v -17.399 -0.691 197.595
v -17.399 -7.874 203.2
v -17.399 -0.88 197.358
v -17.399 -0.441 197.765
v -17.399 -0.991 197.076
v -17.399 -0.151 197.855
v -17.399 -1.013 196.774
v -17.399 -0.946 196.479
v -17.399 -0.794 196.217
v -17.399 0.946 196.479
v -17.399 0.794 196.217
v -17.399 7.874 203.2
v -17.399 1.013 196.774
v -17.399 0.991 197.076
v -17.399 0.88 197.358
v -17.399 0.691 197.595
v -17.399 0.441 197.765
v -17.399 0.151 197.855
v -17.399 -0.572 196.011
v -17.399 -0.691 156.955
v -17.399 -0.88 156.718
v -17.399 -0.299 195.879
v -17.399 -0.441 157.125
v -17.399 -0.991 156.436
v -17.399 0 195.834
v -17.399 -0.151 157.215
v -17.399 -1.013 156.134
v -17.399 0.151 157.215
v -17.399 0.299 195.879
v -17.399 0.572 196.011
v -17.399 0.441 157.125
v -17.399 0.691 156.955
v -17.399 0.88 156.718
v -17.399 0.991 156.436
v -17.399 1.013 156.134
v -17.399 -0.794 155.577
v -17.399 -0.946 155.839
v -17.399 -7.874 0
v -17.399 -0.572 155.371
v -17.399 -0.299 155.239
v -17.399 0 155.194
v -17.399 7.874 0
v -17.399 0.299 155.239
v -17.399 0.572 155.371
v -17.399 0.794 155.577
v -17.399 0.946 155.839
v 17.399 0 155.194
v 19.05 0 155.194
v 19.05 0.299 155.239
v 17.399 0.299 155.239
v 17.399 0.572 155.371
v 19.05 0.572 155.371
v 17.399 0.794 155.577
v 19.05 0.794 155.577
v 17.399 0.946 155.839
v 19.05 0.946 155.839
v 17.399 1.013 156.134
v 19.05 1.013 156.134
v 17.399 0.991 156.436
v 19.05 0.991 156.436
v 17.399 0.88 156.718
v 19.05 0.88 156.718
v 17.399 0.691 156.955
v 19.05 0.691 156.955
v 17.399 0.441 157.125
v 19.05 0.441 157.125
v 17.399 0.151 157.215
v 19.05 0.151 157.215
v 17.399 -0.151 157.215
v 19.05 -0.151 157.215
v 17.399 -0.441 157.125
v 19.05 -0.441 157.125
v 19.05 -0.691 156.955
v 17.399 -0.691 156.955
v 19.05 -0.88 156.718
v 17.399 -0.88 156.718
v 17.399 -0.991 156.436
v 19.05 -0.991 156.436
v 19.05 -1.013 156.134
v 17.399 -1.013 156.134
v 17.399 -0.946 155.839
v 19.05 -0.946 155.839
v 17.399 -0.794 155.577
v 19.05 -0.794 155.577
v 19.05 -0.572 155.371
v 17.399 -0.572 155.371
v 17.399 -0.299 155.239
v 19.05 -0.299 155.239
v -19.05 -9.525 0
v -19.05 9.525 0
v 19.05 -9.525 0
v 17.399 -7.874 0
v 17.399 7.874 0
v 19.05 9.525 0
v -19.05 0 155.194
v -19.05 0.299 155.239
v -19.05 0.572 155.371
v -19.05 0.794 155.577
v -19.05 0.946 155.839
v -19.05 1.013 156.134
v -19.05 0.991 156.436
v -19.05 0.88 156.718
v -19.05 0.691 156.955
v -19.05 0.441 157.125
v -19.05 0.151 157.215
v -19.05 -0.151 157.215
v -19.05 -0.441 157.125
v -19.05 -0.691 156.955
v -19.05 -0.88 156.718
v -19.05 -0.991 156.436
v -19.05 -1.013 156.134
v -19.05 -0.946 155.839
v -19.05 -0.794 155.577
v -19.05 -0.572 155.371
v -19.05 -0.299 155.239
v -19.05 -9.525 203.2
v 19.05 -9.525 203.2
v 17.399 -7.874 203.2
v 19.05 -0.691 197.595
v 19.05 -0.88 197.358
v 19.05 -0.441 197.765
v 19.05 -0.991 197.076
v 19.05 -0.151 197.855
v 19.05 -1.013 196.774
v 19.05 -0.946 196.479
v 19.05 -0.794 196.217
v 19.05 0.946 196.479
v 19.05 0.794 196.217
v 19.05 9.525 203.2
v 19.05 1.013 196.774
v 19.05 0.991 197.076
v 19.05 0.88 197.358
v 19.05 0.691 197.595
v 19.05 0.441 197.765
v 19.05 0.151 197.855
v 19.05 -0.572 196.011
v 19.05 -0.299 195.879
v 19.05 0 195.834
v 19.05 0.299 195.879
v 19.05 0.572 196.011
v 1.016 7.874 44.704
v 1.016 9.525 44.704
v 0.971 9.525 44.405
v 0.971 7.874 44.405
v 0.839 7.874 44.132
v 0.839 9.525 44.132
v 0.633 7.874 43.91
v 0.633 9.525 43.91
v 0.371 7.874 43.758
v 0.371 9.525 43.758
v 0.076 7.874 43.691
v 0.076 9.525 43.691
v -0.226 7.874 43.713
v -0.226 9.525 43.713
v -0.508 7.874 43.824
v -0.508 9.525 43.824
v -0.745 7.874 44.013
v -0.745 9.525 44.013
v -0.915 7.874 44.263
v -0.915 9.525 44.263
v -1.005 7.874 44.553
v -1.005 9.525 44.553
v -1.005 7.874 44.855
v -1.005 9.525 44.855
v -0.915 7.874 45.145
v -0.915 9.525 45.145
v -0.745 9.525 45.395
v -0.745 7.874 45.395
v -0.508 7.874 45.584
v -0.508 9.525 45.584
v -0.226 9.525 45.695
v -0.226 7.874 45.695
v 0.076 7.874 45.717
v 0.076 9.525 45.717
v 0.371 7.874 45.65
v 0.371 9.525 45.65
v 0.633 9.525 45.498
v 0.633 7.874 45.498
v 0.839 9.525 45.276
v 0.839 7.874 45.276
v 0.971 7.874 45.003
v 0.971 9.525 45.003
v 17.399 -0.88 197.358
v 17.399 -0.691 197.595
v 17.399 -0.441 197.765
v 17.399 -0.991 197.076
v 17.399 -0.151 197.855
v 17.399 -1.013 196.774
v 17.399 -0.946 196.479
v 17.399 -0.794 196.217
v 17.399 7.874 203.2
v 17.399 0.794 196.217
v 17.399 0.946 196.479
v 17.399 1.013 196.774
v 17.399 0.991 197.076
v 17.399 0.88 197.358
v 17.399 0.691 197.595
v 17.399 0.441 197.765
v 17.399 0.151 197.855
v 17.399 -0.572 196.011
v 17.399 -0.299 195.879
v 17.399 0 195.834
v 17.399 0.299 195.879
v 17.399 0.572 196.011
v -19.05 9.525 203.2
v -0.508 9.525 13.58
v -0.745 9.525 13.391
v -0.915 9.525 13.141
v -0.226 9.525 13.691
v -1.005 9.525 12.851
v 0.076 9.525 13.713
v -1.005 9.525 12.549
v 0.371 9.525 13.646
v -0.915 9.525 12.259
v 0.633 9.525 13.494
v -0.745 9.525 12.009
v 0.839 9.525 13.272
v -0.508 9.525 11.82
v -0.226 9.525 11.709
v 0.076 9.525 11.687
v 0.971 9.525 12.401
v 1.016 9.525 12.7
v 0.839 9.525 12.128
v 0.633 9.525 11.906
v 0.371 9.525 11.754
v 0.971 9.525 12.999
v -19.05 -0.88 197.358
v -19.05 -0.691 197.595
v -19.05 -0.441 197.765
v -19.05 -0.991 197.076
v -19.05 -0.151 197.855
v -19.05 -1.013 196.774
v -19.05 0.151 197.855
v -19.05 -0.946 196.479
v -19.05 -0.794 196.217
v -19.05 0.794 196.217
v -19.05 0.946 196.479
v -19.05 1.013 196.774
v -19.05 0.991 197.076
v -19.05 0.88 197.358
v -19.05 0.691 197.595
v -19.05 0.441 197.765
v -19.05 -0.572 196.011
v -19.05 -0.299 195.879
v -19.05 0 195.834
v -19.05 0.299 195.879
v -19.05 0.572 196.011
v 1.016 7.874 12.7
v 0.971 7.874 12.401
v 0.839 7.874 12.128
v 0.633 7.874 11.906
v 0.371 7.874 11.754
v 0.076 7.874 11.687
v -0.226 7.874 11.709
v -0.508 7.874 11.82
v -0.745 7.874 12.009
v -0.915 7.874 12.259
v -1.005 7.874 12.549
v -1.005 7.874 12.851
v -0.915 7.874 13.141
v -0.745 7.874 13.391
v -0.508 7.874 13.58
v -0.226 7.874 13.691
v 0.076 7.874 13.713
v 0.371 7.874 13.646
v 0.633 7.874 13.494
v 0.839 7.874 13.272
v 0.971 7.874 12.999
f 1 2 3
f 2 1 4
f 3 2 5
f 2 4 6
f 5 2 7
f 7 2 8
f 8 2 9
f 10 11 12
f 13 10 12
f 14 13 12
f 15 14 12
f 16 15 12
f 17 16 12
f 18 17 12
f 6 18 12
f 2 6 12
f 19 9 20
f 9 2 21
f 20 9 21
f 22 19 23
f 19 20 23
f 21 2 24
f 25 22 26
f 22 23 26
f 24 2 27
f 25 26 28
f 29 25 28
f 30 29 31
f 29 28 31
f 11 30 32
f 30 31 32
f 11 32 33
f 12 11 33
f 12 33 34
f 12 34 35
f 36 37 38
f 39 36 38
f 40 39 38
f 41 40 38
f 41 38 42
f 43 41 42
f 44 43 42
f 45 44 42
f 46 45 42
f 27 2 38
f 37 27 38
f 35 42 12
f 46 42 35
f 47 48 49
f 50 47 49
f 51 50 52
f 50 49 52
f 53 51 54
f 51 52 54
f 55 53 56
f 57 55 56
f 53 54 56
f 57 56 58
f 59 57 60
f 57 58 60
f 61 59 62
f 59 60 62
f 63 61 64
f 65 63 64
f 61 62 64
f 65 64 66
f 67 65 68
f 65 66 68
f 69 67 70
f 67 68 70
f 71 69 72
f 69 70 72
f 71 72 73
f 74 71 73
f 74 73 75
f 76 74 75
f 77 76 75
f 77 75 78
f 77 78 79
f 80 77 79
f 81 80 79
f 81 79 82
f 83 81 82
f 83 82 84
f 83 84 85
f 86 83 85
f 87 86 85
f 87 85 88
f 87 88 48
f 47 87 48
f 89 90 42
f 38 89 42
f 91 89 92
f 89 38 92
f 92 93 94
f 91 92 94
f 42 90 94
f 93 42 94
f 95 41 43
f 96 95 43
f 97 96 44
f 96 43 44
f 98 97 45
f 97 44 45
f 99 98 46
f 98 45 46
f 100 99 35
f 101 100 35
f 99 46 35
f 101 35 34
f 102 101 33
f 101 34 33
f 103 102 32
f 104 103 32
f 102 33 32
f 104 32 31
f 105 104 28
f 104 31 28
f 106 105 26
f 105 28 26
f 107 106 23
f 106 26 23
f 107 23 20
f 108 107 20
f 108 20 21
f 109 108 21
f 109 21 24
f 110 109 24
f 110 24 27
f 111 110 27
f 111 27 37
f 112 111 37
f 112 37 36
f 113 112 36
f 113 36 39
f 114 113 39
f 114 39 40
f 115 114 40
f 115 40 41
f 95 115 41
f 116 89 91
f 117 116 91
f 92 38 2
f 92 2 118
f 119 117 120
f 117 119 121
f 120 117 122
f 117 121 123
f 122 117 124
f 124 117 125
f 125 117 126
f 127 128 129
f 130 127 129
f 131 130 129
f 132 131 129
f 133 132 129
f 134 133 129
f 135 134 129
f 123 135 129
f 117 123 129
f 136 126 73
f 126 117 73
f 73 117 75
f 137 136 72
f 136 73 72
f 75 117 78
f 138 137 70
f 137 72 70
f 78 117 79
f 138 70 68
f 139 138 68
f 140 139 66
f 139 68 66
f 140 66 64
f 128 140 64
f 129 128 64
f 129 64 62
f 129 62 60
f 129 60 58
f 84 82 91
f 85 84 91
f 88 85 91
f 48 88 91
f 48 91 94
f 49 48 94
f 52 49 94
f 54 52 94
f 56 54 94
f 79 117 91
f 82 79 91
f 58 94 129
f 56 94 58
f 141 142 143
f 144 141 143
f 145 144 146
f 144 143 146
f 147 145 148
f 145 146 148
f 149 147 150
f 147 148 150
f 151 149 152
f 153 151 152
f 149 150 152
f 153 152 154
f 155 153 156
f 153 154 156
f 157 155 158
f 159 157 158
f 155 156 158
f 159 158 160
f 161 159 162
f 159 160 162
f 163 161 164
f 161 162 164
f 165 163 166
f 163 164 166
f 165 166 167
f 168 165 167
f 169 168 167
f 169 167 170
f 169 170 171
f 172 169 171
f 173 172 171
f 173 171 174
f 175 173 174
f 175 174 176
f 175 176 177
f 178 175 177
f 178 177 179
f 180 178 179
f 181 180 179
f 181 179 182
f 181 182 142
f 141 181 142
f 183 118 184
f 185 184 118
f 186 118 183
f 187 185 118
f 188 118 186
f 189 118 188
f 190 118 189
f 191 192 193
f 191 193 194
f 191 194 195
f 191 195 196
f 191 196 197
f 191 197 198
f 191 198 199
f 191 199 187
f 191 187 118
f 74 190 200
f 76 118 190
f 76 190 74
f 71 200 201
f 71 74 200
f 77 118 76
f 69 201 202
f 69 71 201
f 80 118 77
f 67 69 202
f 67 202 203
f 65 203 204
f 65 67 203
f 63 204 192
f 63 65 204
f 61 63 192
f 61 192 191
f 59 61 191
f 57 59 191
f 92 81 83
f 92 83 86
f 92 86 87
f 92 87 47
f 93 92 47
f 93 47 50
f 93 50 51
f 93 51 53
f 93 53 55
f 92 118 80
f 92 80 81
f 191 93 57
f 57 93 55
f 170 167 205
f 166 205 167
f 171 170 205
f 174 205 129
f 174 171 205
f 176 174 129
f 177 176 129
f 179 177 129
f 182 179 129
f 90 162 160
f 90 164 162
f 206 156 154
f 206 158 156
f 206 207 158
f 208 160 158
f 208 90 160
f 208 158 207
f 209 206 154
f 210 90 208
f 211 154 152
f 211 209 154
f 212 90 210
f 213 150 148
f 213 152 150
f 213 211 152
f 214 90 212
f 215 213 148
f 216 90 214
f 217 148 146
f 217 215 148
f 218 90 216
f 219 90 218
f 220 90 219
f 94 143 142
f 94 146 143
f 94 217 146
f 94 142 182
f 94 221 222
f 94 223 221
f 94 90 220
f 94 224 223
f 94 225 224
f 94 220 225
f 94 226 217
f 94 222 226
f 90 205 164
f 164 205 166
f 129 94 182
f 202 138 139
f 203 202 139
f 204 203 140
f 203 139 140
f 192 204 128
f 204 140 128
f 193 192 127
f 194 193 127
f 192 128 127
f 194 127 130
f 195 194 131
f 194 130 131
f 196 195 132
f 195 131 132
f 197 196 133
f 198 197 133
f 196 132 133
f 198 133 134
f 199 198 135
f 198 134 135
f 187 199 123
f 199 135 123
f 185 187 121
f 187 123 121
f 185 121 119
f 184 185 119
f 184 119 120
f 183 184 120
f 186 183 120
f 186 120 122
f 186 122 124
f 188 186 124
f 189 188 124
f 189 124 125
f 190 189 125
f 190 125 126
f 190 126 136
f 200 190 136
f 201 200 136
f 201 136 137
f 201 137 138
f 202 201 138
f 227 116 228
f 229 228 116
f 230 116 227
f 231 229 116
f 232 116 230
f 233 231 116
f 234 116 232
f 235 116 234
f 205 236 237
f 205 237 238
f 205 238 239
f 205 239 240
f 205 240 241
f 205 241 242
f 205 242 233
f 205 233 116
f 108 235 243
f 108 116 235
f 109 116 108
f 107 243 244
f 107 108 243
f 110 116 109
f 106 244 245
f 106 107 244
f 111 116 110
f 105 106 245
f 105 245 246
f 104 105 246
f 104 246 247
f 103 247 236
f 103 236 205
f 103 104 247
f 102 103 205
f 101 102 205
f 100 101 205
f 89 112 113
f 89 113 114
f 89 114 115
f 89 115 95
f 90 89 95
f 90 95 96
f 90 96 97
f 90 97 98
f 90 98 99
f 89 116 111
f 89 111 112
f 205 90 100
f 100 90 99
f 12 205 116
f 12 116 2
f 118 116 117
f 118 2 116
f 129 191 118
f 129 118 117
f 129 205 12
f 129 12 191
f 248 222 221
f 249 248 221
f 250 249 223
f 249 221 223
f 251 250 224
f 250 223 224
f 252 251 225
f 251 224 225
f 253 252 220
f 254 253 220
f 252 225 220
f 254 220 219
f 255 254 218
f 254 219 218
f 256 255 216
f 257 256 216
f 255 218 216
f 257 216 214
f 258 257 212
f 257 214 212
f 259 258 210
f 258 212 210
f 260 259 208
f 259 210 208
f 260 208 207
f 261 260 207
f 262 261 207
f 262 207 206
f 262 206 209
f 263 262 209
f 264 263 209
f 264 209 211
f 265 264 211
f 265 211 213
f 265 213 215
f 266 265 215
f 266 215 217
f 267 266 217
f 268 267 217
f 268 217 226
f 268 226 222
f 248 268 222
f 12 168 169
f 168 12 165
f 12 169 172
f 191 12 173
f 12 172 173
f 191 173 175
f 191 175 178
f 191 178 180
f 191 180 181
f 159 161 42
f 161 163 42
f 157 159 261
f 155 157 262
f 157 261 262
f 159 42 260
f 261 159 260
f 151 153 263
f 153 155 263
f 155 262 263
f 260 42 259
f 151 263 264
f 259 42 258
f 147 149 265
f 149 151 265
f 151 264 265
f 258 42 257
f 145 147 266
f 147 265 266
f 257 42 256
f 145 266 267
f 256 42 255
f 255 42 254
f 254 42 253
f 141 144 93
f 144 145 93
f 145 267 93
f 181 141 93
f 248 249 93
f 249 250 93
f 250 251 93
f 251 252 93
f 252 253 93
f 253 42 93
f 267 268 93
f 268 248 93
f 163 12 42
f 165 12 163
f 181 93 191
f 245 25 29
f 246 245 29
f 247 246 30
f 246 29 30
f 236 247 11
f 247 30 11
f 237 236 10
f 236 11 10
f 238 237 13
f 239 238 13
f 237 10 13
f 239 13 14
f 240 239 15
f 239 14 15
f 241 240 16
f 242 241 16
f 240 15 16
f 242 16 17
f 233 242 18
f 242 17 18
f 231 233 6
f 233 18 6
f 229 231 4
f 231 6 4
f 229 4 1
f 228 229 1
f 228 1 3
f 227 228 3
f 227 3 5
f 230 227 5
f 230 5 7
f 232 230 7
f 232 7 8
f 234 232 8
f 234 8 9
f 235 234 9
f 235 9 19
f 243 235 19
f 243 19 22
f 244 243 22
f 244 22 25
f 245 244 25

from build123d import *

# Parameters (mm, degrees)
SKETCH2_W           = 38.1
SKETCH2_H           = 19.05
SKETCH2_W_2         = 34.798
SKETCH2_H_2         = 15.748
BOSS_EXTRUDE1_DEPTH = 203.2
SKETCH3_R           = 1.016
CUT_EXTRUDE1_DEPTH  = 39.1
CUT_EXTRUDE2_REACH  = 21.05
SKETCH6_R           = 1.016


with BuildPart() as part:
    # Sketch2 → Boss-Extrude1 (new body)
    with BuildSketch(Plane.XY):
        Rectangle(SKETCH2_W, SKETCH2_H)
        Rectangle(SKETCH2_W_2, SKETCH2_H_2, mode=Mode.SUBTRACT)
    extrude(amount=BOSS_EXTRUDE1_DEPTH)

    # Sketch3 → Cut-Extrude1 (cut, through all)
    with BuildSketch(Plane(origin=(19.05, 0, 0), x_dir=(0, 0, -1), z_dir=(1, 0, 0))):
        with Locations((-196.85, 0)):
            Circle(SKETCH3_R)
        with Locations((-156.21, 0)):
            Circle(SKETCH3_R)
    extrude(amount=-CUT_EXTRUDE1_DEPTH, mode=Mode.SUBTRACT)

    # Sketch6 → Cut-Extrude2 (cut, up to next)
    with BuildSketch(Plane(origin=(0, 9.525, 0), x_dir=(1, 0, 0), z_dir=(0, 1, 0)), mode=Mode.PRIVATE) as cut_extrude2_sk1:
        with Locations((0, -12.7)):
            Circle(SKETCH6_R)
    cut_extrude2_tool1 = extrude(cut_extrude2_sk1.sketch, amount=-CUT_EXTRUDE2_REACH, mode=Mode.PRIVATE) & part.part
    add(cut_extrude2_tool1.solids().sort_by_distance((0, 9.525, 12.7))[0], mode=Mode.SUBTRACT)
    # Sketch6 → Cut-Extrude2 (cut, up to next)
    with BuildSketch(Plane(origin=(0, 9.525, 0), x_dir=(1, 0, 0), z_dir=(0, 1, 0)), mode=Mode.PRIVATE) as cut_extrude2_sk2:
        with Locations((0, -44.704)):
            Circle(SKETCH6_R)
    cut_extrude2_tool2 = extrude(cut_extrude2_sk2.sketch, amount=-CUT_EXTRUDE2_REACH, mode=Mode.PRIVATE) & part.part
    add(cut_extrude2_tool2.solids().sort_by_distance((0, 9.525, 44.704))[0], mode=Mode.SUBTRACT)


solid = part.part
